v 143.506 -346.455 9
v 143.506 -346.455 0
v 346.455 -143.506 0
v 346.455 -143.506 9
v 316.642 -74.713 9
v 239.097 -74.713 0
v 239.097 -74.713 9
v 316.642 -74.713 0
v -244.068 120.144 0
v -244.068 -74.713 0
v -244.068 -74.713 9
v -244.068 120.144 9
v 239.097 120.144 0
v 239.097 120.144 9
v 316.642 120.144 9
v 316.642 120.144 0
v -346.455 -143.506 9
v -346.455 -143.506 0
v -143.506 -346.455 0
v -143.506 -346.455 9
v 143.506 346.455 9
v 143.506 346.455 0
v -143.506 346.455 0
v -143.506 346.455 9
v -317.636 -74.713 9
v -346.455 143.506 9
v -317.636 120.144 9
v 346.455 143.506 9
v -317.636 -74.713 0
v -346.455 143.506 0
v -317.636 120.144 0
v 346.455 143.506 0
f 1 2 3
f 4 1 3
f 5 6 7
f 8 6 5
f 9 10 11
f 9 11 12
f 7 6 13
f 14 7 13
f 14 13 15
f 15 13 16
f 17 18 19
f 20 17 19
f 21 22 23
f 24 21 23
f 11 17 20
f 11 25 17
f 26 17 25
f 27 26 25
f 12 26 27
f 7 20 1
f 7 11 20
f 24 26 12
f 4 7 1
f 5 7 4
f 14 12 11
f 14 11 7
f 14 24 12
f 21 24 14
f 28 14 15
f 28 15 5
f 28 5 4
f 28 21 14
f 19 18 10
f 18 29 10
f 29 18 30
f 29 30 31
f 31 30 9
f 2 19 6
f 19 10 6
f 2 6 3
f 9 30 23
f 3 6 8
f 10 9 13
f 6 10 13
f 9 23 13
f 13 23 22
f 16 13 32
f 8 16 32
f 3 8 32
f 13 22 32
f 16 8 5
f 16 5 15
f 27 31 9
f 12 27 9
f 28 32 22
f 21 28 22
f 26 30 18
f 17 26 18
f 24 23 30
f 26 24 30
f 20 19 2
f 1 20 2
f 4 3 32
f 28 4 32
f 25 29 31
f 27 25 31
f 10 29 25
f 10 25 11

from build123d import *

# Parameters (mm, degrees)
F1_DEPTH = 9
F2_W     = 77.544987
F2_H     = 194.856629
F3_DEPTH = 9.001
F2_W_2   = 73.568299
F4_DEPTH = 9.001


with BuildPart() as f1:
    # F0 (on Top) → F1 (new body)
    with BuildSketch(Plane.XY):
        Polygon((143.506287, 346.454825), (-143.506287, 346.454825), (-346.454825, 143.506287), (-346.454825, -143.506287), (-143.506287, -346.454825), (143.506287, -346.454825), (346.454825, -143.506287), (346.454825, 143.506287), align=None)
    extrude(amount=F1_DEPTH)

    # F2 (on face) → F3 (cut, through all)
    with BuildSketch(Plane.XY):
        with Locations((277.869523, 22.715778)):
            Rectangle(F2_W, F2_H)
    extrude(amount=F3_DEPTH, mode=Mode.SUBTRACT)

    # F2 (on face) → F4 (cut, through all)
    with BuildSketch(Plane.XY):
        with Locations((-280.852013, 22.715778)):
            Rectangle(F2_W_2, F2_H)
    extrude(amount=F4_DEPTH, mode=Mode.SUBTRACT)


solid = f1.part
